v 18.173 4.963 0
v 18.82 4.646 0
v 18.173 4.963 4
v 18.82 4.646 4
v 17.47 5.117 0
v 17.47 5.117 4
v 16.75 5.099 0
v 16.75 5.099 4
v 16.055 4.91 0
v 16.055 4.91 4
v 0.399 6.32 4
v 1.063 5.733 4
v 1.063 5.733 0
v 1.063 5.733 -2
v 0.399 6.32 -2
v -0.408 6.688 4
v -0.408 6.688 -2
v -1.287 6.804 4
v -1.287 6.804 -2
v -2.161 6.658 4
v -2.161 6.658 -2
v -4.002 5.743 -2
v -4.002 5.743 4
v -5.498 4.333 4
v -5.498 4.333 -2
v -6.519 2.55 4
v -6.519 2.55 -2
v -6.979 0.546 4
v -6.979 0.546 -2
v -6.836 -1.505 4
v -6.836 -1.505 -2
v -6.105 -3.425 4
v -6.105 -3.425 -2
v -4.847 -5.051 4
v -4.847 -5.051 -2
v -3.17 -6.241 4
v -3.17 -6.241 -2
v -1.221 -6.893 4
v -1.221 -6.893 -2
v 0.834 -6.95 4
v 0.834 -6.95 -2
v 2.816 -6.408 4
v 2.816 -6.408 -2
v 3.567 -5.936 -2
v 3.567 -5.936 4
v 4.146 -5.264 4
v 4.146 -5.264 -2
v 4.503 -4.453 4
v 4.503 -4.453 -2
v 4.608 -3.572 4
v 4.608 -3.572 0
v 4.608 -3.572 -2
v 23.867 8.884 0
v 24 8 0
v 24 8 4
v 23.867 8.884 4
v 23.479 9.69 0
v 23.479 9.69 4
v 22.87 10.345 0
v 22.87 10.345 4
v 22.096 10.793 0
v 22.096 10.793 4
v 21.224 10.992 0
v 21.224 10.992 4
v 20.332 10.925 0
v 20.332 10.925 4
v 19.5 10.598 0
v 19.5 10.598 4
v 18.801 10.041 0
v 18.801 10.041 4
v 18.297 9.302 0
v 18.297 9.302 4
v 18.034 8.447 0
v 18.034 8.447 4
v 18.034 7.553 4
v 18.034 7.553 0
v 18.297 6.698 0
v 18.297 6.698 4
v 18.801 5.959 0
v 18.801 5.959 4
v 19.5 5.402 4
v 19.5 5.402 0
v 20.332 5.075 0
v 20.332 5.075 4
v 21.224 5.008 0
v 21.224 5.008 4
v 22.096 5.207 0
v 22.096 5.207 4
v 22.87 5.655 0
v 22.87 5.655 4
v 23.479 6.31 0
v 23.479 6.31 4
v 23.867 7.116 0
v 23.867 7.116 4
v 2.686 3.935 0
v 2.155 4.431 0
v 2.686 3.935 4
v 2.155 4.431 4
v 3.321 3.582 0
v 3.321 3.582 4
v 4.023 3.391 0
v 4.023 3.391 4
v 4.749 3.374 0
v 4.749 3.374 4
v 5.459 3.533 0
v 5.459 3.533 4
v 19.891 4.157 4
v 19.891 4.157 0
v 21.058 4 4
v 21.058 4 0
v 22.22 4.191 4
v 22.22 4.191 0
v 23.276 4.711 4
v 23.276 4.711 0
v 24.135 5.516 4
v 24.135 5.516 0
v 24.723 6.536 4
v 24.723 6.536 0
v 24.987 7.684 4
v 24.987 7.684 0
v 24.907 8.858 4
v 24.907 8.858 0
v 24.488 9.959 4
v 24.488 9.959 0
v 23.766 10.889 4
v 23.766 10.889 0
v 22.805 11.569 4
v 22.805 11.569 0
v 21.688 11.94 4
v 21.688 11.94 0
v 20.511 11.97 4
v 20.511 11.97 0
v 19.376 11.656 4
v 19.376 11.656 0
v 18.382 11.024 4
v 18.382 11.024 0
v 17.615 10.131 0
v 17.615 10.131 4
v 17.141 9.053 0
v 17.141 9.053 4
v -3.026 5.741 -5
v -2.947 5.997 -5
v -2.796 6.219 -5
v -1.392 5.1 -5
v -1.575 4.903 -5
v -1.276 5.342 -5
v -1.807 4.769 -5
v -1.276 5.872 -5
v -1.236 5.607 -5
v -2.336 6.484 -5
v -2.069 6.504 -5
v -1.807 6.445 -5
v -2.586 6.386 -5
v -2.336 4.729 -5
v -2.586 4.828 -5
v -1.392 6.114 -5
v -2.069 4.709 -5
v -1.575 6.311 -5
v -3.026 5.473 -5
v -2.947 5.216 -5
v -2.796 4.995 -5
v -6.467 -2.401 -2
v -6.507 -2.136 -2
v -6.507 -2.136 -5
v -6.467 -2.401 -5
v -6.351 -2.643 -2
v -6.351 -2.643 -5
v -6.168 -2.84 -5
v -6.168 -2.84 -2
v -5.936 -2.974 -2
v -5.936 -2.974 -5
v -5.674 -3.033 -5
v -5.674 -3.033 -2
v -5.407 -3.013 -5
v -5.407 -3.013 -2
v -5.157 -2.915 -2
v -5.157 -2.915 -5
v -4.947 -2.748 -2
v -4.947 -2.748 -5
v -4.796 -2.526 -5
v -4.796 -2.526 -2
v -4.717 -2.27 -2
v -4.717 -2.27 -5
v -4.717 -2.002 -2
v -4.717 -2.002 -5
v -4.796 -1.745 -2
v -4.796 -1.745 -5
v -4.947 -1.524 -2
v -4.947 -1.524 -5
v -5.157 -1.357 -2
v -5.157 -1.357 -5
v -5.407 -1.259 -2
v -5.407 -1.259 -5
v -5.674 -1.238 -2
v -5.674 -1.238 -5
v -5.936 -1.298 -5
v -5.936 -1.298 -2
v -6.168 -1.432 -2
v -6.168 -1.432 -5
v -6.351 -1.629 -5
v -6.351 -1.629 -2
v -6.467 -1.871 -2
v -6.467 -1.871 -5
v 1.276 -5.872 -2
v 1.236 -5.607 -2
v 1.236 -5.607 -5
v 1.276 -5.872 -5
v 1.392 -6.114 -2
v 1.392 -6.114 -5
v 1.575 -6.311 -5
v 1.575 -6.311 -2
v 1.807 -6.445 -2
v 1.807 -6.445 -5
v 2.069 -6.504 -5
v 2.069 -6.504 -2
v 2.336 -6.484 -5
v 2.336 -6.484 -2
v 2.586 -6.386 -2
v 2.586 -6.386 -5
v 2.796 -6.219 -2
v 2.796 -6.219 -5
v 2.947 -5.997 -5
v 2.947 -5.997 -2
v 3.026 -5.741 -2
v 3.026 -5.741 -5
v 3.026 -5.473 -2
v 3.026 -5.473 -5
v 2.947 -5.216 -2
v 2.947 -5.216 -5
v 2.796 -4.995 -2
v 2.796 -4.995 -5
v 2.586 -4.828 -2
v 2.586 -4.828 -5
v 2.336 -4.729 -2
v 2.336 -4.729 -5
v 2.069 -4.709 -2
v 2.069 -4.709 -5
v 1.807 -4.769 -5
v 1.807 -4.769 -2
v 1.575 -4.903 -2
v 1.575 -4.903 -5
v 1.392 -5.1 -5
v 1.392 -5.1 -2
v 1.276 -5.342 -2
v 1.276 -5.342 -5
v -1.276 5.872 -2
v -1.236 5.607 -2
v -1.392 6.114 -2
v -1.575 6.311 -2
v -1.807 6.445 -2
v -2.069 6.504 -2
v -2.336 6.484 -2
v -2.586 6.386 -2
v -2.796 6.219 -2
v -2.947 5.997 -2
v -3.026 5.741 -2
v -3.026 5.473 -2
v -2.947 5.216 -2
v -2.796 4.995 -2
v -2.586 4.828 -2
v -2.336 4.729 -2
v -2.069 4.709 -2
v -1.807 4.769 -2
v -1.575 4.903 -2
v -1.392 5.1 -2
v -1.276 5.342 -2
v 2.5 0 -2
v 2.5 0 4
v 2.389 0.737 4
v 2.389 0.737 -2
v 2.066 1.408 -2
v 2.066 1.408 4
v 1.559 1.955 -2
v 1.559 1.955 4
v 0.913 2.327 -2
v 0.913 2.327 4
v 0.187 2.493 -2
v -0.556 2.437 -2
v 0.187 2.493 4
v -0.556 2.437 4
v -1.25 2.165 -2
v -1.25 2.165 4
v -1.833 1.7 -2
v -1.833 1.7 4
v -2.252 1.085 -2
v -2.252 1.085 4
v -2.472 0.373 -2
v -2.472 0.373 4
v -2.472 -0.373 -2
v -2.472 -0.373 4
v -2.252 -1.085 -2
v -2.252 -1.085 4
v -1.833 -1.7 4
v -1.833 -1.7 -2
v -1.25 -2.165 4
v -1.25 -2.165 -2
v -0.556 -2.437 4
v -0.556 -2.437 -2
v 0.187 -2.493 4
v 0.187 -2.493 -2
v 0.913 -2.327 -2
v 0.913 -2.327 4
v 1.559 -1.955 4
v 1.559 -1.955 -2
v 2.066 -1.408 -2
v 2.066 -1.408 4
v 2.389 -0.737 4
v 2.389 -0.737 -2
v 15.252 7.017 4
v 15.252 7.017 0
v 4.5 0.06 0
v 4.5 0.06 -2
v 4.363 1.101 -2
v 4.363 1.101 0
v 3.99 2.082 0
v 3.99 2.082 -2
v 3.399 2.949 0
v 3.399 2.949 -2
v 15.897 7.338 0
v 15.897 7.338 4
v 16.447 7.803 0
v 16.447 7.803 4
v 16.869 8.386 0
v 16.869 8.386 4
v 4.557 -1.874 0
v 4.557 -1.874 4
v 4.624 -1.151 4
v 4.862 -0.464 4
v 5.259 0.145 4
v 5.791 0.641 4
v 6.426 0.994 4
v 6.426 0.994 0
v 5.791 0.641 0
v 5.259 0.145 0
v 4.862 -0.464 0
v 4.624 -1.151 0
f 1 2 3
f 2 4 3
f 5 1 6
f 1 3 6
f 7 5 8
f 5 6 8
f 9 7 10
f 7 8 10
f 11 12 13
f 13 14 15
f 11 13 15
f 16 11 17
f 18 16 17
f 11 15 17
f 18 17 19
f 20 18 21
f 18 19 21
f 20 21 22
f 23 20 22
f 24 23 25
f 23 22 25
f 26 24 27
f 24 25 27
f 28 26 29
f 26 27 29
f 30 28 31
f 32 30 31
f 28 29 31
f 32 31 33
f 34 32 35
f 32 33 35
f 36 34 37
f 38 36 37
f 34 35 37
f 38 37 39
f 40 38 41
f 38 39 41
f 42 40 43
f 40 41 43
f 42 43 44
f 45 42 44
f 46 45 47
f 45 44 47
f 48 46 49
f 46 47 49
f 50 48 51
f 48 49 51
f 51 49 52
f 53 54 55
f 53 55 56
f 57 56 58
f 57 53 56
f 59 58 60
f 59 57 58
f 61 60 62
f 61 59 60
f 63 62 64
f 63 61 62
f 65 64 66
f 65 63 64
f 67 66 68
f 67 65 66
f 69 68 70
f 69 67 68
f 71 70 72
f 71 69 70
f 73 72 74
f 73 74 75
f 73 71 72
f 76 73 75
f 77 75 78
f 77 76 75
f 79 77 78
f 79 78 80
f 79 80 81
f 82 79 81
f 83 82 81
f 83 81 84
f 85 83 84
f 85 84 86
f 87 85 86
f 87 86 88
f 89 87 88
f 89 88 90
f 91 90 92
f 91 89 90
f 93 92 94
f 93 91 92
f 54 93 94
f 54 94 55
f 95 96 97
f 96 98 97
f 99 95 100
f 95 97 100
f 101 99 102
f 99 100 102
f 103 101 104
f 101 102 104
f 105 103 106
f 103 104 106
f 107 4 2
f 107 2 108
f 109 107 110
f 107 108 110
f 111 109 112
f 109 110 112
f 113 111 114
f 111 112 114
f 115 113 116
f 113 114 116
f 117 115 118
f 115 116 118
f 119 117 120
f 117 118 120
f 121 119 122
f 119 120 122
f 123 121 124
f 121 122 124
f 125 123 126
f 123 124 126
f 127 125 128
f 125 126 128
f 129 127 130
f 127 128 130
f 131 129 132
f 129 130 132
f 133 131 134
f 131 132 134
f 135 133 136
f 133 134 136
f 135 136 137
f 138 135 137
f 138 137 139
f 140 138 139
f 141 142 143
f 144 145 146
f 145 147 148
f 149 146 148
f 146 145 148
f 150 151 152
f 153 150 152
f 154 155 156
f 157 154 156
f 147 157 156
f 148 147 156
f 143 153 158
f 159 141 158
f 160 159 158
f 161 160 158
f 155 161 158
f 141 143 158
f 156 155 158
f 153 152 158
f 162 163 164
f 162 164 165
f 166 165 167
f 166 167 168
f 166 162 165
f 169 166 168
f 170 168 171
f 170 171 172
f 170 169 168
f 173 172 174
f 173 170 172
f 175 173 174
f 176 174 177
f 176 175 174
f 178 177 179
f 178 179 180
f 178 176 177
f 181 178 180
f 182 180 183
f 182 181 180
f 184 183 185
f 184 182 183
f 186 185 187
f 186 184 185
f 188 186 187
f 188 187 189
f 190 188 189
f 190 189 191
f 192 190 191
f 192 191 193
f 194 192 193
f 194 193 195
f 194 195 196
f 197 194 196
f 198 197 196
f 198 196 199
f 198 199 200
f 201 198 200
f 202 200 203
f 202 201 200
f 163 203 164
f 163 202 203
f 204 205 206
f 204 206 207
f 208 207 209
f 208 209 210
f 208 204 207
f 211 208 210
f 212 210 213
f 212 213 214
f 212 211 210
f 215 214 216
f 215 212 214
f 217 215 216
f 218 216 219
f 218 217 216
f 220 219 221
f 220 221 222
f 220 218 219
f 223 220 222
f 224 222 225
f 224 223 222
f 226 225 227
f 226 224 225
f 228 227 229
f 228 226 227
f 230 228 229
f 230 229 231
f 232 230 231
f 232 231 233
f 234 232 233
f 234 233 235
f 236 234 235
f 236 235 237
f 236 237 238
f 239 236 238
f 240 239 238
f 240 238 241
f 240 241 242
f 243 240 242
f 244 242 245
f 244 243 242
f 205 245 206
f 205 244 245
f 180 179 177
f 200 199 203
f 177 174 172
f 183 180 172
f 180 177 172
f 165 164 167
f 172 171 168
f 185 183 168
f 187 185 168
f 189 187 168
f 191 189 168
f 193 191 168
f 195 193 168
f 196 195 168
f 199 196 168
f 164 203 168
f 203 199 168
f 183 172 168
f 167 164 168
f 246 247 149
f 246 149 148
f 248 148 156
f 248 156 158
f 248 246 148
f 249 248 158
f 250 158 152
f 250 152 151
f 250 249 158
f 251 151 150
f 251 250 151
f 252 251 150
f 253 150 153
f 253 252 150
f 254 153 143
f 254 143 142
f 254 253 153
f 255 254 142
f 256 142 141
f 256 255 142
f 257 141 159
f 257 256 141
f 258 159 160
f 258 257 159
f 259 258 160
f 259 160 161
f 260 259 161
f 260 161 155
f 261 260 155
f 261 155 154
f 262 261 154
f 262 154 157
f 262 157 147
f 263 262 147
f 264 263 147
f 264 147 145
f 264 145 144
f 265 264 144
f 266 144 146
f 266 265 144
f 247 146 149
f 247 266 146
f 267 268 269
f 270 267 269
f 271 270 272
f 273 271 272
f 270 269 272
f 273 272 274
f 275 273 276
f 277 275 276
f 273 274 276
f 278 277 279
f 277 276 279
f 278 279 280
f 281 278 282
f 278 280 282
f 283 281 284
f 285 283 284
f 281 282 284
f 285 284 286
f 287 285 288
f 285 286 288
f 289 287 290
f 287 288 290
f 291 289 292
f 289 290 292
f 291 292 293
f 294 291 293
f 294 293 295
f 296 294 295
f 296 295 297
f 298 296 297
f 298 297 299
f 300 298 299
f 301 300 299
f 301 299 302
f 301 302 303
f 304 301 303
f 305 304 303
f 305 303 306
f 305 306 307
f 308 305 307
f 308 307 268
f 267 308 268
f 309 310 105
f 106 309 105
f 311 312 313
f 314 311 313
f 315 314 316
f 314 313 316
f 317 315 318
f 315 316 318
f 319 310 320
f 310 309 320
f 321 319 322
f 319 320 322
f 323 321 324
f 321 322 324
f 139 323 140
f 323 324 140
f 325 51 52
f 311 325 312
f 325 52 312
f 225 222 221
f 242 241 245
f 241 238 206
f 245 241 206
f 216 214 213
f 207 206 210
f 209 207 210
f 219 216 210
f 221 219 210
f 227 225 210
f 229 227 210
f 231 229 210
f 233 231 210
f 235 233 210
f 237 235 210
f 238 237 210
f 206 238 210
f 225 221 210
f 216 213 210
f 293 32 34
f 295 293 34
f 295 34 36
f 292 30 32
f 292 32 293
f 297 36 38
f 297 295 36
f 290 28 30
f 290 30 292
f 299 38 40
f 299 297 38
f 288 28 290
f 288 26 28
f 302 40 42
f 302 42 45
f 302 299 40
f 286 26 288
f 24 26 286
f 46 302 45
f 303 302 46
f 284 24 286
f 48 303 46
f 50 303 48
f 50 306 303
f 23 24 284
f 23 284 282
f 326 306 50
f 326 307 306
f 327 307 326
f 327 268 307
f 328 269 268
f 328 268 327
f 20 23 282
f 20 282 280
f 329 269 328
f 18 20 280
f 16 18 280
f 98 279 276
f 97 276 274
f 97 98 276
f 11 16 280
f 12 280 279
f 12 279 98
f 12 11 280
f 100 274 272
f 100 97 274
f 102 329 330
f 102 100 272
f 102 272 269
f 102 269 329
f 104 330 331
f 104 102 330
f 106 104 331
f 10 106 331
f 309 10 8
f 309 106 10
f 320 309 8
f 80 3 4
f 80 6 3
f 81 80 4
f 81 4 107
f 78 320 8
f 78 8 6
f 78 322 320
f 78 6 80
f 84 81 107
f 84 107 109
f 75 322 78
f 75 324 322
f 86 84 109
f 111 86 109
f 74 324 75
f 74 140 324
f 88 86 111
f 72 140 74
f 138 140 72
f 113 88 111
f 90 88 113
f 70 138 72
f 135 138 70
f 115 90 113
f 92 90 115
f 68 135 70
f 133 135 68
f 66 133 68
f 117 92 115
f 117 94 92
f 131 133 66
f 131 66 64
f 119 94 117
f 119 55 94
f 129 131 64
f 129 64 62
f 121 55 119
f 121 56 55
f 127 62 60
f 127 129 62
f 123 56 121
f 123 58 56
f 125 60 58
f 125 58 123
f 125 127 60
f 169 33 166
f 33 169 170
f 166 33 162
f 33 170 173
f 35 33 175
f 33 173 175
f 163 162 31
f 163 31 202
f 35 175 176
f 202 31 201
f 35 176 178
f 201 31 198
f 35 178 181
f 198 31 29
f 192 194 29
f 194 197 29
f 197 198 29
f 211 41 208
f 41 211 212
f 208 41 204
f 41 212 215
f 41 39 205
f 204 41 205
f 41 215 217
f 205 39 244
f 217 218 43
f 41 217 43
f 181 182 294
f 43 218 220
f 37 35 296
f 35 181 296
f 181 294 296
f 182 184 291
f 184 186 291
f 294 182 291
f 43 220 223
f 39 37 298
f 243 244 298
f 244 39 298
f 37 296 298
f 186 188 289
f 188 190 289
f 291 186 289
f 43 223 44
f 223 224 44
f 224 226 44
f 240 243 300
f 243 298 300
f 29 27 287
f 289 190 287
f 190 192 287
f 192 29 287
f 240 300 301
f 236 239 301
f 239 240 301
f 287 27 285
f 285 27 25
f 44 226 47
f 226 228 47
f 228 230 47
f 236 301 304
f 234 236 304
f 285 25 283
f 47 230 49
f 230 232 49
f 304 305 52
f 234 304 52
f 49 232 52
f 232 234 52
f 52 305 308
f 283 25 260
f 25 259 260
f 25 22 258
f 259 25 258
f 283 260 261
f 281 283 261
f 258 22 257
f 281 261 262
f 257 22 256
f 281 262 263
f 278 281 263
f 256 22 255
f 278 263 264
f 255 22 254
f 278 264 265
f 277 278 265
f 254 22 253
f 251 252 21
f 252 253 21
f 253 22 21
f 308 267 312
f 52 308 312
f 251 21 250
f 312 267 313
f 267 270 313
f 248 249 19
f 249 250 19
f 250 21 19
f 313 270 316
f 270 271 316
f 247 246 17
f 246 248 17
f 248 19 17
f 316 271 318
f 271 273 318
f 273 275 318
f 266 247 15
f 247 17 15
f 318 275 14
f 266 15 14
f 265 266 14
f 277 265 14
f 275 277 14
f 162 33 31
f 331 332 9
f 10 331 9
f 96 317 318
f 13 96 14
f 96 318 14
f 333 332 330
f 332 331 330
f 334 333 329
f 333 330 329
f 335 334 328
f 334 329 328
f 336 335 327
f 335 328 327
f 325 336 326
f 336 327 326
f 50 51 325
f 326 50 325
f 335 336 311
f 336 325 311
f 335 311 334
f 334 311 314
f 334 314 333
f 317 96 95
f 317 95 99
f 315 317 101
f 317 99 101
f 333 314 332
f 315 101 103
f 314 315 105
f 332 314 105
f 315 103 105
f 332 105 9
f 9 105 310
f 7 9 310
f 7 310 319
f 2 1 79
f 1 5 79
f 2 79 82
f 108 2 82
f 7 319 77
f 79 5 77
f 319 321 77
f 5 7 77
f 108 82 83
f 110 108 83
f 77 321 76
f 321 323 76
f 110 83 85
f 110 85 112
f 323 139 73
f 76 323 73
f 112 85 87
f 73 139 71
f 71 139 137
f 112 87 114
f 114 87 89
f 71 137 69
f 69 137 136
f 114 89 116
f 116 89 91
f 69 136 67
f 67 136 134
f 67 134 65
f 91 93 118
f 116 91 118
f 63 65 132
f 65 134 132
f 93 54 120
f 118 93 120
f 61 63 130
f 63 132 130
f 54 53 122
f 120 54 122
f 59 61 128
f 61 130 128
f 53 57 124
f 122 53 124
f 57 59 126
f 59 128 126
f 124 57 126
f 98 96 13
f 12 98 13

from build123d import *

# Parameters (mm, degrees)
SKETCH1_R           = 3
BOSS_EXTRUDE1_DEPTH = 4
FILLET1_R           = 3
FILLET2_R           = 3
BOSS_EXTRUDE2_START = -2
BOSS_EXTRUDE2_DEPTH = 2
SKETCH2_R           = 2.5
CUT_EXTRUDE1_DEPTH  = 29.372521918
SKETCH4_R           = 0.9
BOSS_EXTRUDE3_DEPTH = 3


with BuildPart() as part:
    # Sketch1 → Boss-Extrude1 (new body)
    with BuildSketch(Plane.XY):
        with BuildLine():
            Line((4.495140924, 0.209064756), (17.788851391, 5.614937189))
            ThreePointArc((17.788851391, 5.614937189), (24.73795094, 9.42398131), (17.01587301, 7.64400544))
            Line((17.01587301, 7.64400544), (3.494878983, 2.834752351))
            Line((3.494878983, 2.834752351), (1.063186177, 5.732879237))
            ThreePointArc((1.063186177, 5.732879237), (-0.407640956, 6.688232403), (-2.161242517, 6.658005015))
            ThreePointArc((-2.161242517, 6.658005015), (-6.541414145, -2.491967293), (2.816438132, -6.408406686))
            ThreePointArc((2.816438132, -6.408406686), (4.145674153, -5.264219757), (4.608056658, -3.572405775))
            Line((4.608056658, -3.572405775), (4.495140924, 0.209064756))
        make_face()
        with Locations((21, 8)):
            Circle(SKETCH1_R, mode=Mode.SUBTRACT)
    extrude(amount=BOSS_EXTRUDE1_DEPTH)

    # Fillet1
    fillet1_edges = [part.edges().sort_by_distance(p)[0] for p in [
        (3.494878983, 2.834752351, 2),
        (4.495140924, 0.209064756, 2),
    ]]
    fillet(fillet1_edges, radius=FILLET1_R)

    # Fillet2
    fillet2_edges = [part.edges().sort_by_distance(p)[0] for p in [
        (17.788851391, 5.614937189, 2),
        (17.01587301, 7.64400544, 2),
    ]]
    fillet(fillet2_edges, radius=FILLET2_R)

    # Sketch1<3> → Boss-Extrude2 (add)
    with BuildSketch(Plane.XY.offset(BOSS_EXTRUDE2_START)):
        with BuildLine():
            Line((3.398714044, 2.949363125), (1.063186177, 5.732879237))
            ThreePointArc((1.063186177, 5.732879237), (-0.407640956, 6.688232403), (-2.161242517, 6.658005015))
            ThreePointArc((-2.161242517, 6.658005015), (-6.541414145, -2.491967293), (2.816438132, -6.408406686))
            ThreePointArc((2.816438132, -6.408406686), (4.145674153, -5.264219757), (4.608056658, -3.572405775))
            Line((4.608056658, -3.572405775), (4.499606346, 0.059520833))
            ThreePointArc((4.499606346, 0.059520833), (4.205194807, 1.601978974), (3.398714044, 2.949363125))
        make_face()
    extrude(amount=BOSS_EXTRUDE2_DEPTH)

    # Sketch2 → Cut-Extrude1 (cut, through all)
    with BuildSketch(Plane.XY.offset(4)):
        Circle(SKETCH2_R)
    extrude(amount=-CUT_EXTRUDE1_DEPTH, mode=Mode.SUBTRACT)

    # Sketch4 → Boss-Extrude3 (add)
    with BuildSketch(Plane.XY.offset(-2)):
        with Locations((-2.135971966, 5.60692641)):
            Circle(SKETCH4_R)
        with Locations((2.135971966, -5.60692641)):
            Circle(SKETCH4_R)
        with Locations((-5.60692641, -2.135971966)):
            Circle(SKETCH4_R)
    extrude(amount=-BOSS_EXTRUDE3_DEPTH)


solid = part.part
